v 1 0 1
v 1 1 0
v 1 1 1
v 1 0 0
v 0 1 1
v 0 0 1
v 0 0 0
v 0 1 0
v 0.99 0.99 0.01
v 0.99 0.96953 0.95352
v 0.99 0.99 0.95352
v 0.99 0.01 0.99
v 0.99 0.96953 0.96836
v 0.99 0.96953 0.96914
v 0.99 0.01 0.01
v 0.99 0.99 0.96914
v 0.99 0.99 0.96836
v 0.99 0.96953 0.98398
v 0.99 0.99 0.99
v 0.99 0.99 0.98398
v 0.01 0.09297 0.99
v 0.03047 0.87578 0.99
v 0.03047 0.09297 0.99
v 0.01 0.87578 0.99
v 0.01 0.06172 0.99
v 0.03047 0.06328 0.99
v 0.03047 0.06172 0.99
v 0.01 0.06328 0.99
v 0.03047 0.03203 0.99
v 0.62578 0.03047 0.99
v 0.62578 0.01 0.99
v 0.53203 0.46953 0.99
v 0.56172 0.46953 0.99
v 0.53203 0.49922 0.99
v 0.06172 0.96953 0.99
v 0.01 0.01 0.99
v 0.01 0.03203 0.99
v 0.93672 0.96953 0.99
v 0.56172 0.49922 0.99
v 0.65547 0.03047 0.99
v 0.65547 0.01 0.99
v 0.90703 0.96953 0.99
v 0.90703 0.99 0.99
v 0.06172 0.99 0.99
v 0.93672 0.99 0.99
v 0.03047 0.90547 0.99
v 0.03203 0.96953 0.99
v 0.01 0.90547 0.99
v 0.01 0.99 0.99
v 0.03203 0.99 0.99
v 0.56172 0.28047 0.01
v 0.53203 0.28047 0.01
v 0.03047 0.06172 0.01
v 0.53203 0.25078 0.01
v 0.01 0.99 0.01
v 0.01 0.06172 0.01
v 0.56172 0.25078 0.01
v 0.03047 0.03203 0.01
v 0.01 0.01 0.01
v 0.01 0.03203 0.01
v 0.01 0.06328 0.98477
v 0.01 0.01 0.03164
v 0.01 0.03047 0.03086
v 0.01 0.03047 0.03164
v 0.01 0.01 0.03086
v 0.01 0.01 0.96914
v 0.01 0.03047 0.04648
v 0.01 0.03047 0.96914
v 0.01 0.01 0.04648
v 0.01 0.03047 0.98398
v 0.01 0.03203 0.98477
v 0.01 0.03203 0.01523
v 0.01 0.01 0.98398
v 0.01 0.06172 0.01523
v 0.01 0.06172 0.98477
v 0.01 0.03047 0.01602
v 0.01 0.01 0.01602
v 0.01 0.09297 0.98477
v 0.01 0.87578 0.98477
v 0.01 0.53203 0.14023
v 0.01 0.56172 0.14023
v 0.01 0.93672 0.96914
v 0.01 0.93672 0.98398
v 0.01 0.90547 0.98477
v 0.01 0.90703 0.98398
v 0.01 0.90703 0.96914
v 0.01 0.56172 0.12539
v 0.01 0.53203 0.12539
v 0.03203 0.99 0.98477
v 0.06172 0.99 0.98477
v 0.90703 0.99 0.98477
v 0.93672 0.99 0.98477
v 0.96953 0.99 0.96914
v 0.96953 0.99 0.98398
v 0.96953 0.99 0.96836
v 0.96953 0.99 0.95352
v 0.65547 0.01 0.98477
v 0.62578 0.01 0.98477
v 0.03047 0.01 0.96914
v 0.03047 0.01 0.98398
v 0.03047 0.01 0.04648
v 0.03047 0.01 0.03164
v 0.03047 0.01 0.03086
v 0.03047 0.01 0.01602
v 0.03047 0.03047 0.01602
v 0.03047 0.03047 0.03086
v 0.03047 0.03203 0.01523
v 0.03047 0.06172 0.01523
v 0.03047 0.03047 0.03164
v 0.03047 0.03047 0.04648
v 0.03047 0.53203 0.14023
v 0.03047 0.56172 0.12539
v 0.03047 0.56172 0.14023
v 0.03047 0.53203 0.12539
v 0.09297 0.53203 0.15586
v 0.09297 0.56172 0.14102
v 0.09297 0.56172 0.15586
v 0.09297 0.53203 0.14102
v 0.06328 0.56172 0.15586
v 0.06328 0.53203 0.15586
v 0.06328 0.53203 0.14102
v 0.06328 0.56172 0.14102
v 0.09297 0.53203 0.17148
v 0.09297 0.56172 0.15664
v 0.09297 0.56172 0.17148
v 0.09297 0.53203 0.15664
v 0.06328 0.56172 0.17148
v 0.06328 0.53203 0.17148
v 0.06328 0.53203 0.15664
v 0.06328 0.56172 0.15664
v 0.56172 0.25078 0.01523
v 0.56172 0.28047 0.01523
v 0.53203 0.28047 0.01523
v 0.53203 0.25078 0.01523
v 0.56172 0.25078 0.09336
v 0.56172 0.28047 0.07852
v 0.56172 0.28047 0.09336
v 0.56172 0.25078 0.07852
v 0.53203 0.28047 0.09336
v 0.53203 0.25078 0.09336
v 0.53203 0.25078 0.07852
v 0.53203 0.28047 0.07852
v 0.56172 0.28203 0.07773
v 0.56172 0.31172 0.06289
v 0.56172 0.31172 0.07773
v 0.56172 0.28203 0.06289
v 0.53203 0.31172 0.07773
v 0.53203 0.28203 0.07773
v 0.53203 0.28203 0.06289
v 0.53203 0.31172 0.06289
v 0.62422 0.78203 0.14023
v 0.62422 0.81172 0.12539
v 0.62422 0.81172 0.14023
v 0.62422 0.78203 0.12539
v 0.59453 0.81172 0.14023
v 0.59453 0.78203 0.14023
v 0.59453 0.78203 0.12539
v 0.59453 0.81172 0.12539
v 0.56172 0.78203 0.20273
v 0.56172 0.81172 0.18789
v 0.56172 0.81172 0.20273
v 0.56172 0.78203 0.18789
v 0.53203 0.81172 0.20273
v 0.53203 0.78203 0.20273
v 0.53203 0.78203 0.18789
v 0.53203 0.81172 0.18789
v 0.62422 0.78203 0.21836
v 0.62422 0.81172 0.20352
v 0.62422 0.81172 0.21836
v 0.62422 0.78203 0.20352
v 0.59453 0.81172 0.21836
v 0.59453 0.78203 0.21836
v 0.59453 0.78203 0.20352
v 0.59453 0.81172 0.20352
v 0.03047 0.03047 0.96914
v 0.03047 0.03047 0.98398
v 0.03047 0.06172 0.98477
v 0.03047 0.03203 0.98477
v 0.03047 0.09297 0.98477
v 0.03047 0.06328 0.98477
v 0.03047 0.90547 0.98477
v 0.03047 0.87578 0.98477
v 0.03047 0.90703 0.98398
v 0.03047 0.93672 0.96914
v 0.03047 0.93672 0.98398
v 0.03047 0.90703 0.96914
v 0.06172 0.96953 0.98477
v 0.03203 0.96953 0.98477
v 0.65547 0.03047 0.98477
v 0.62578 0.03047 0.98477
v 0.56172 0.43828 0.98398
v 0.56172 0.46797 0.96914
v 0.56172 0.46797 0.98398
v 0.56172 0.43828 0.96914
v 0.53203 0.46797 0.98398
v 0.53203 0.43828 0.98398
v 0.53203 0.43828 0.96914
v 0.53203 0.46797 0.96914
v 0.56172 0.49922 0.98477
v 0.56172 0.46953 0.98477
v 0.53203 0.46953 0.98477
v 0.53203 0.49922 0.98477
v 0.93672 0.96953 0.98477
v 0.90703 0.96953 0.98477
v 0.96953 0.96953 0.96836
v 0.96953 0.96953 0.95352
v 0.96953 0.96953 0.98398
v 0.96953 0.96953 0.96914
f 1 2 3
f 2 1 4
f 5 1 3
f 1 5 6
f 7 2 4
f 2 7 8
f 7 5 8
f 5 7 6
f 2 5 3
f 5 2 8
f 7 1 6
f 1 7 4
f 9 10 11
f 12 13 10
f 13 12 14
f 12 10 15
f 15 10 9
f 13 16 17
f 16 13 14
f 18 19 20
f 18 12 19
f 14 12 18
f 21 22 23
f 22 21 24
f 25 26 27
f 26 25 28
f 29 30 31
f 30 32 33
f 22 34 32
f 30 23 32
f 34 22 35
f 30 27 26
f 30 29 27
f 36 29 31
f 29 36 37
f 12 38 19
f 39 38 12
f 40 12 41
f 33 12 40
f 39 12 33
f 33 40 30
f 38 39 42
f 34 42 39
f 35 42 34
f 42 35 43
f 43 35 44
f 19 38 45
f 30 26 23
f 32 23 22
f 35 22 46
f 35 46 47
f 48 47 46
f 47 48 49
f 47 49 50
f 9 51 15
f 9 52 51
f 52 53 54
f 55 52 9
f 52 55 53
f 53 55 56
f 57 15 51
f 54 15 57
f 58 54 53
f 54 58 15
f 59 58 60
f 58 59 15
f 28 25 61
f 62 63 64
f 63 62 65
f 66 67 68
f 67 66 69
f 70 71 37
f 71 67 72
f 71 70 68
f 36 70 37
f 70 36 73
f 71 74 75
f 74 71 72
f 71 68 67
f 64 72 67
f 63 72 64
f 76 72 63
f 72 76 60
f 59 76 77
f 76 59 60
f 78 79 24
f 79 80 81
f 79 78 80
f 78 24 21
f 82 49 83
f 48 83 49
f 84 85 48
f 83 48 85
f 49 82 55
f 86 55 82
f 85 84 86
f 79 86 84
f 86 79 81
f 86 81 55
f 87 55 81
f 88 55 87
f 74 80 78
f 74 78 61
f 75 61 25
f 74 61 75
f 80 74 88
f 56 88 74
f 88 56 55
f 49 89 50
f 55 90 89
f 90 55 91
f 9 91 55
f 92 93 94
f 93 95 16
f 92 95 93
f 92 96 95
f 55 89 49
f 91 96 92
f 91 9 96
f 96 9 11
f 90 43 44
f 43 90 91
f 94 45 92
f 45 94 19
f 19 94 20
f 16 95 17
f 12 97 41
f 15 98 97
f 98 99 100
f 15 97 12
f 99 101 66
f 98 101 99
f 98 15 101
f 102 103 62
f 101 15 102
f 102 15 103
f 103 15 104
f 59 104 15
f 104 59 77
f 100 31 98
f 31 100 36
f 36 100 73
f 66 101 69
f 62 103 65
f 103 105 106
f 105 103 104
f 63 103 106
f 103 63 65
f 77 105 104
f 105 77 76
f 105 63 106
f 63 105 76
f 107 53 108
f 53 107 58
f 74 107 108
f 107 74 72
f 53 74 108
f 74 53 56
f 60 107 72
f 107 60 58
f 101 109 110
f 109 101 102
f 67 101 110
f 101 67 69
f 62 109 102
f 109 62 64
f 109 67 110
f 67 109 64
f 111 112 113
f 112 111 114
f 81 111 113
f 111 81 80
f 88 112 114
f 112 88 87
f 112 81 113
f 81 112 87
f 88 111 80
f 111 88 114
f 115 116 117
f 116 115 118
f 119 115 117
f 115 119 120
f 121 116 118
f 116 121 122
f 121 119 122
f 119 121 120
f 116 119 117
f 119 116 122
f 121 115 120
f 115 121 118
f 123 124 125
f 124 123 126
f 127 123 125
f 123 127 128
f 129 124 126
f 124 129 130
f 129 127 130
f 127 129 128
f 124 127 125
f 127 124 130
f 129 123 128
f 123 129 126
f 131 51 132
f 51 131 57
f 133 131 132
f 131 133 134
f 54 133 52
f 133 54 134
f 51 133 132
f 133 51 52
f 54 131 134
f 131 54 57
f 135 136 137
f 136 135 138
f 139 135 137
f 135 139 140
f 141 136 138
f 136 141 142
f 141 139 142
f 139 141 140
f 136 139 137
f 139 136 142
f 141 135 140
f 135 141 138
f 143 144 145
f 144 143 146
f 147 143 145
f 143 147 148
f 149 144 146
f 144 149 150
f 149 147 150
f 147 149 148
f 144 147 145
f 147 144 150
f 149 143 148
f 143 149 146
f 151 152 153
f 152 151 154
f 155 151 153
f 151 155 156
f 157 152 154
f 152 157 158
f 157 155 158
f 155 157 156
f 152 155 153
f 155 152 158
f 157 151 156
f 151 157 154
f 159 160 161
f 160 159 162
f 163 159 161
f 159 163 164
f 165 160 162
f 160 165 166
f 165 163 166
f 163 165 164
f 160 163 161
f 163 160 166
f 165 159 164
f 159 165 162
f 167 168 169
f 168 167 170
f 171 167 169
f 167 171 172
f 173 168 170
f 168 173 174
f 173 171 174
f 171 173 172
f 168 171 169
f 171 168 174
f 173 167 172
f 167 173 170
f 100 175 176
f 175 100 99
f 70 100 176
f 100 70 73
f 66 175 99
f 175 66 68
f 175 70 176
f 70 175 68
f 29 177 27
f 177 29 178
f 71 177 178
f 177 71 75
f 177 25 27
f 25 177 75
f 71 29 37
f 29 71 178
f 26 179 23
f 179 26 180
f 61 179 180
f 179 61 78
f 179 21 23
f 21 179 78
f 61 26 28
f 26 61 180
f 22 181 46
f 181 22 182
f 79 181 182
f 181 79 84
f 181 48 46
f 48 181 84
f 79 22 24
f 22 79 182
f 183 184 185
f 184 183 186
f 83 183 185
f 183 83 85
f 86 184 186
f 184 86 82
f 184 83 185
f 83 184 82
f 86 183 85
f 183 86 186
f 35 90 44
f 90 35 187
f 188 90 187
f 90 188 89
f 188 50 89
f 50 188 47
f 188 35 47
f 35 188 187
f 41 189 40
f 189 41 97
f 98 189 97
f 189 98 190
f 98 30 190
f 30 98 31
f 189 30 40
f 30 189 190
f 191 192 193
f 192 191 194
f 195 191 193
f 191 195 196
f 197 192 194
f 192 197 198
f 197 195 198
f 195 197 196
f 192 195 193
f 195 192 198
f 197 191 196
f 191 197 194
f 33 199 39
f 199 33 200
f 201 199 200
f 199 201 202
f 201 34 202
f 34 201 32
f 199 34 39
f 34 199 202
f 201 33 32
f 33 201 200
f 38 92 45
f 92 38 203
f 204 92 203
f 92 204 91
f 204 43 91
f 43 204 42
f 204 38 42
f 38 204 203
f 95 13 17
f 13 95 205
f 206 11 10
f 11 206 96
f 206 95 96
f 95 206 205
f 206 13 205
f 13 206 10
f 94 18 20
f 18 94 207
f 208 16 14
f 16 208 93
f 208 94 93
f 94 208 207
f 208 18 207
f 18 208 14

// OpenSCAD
translate([0.015625, 0.015625, 0.0234375]) color([0.8440138664027805, 0.665550526029575, 0.09941699496205336]) cube([0.0296875, 0.0296875, 0.01484375], center=true);
translate([0.015625, 0.046875, 0.0078125]) color([0.5970192839849904, 0.22160039129107267, 0.18410424356945654]) cube([0.0296875, 0.0296875, 0.01484375], center=true);
translate([0.015625, 0.015625, 0.0390625]) color([0.16682872622106126, 0.8710958648904819, 0.35556240810586814]) cube([0.0296875, 0.0296875, 0.01484375], center=true);
translate([0.015625, 0.546875, 0.1328125]) color([0.286186680912879, 0.2448130619181087, 0.6070504763830296]) cube([0.0296875, 0.0296875, 0.01484375], center=true);
translate([0.078125, 0.546875, 0.1484375]) color([0.3691685121518685, 0.6107264992233579, 0.11715691588698096]) cube([0.0296875, 0.0296875, 0.01484375], center=true);
translate([0.078125, 0.546875, 0.1640625]) color([0.19702949864854358, 0.43075177453431657, 0.037463457580714454]) cube([0.0296875, 0.0296875, 0.01484375], center=true);
translate([0.546875, 0.265625, 0.0078125]) color([0.43239350097995366, 0.9703406215205468, 0.7852325434107693]) cube([0.0296875, 0.0296875, 0.01484375], center=true);
translate([0.546875, 0.265625, 0.0859375]) color([0.18253864446930168, 0.7442900344208522, 0.2376224703169526]) cube([0.0296875, 0.0296875, 0.01484375], center=true);
translate([0.546875, 0.296875, 0.0703125]) color([0.9226413672651035, 0.9499809866756858, 0.3230381765741599]) cube([0.0296875, 0.0296875, 0.01484375], center=true);
translate([0.609375, 0.796875, 0.1328125]) color([0.709680111378311, 0.31196725781949375, 0.3973490391338589]) cube([0.0296875, 0.0296875, 0.01484375], center=true);
translate([0.546875, 0.796875, 0.1953125]) color([0.11817843075799939, 0.6948693109872913, 0.5560446531383123]) cube([0.0296875, 0.0296875, 0.01484375], center=true);
translate([0.609375, 0.796875, 0.2109375]) color([0.014842856579392438, 0.5130601405591393, 0.794475070484827]) cube([0.0296875, 0.0296875, 0.01484375], center=true);
translate([0.015625, 0.015625, 0.9765625]) color([0.8236445227317202, 0.9740403196348697, 0.18223129700608443]) cube([0.0296875, 0.0296875, 0.01484375], center=true);
translate([0.015625, 0.046875, 0.9921875]) color([0.8939662833946282, 0.9472155856957577, 0.3582188634187269]) cube([0.0296875, 0.0296875, 0.01484375], center=true);
translate([0.015625, 0.078125, 0.9921875]) color([0.6922188754593612, 0.5658256655851466, 0.11939580049948895]) cube([0.0296875, 0.0296875, 0.01484375], center=true);
translate([0.015625, 0.890625, 0.9921875]) color([0.24153436580708498, 0.536443777220809, 0.5345098394928438]) cube([0.0296875, 0.0296875, 0.01484375], center=true);
translate([0.015625, 0.921875, 0.9765625]) color([0.4407247766517032, 0.4003474544319532, 0.837249197968185]) cube([0.0296875, 0.0296875, 0.01484375], center=true);
translate([0.046875, 0.984375, 0.9921875]) color([0.29906126693914803, 0.9370684699760594, 0.0026779948605607506]) cube([0.0296875, 0.0296875, 0.01484375], center=true);
translate([0.640625, 0.015625, 0.9921875]) color([0.9219394171607648, 0.10300838076193775, 0.8337848933605866]) cube([0.0296875, 0.0296875, 0.01484375], center=true);
translate([0.546875, 0.453125, 0.9765625]) color([0.6488521012635771, 0.6575238252696276, 0.3761314098768833]) cube([0.0296875, 0.0296875, 0.01484375], center=true);
translate([0.546875, 0.484375, 0.9921875]) color([0.7767057307270164, 0.9699139644049584, 0.99930046836346]) cube([0.0296875, 0.0296875, 0.01484375], center=true);
translate([0.921875, 0.984375, 0.9921875]) color([0.8083016454560775, 0.6164645916519479, 0.7175471879961917]) cube([0.0296875, 0.0296875, 0.01484375], center=true);
translate([0.984375, 0.984375, 0.9609375]) color([0.672140586291861, 0.0658750423046135, 0.2490263726866888]) cube([0.0296875, 0.0296875, 0.01484375], center=true);
translate([0.984375, 0.984375, 0.9765625]) color([0.5825940505013373, 0.13281273780696, 0.7870028448233393]) cube([0.0296875, 0.0296875, 0.01484375], center=true);
color([0.3,0.3,0.3,0.3]) difference() { cube([1,1,1]); translate([0.01,0.01,0.01]) cube([0.98,0.98,0.98]); }
